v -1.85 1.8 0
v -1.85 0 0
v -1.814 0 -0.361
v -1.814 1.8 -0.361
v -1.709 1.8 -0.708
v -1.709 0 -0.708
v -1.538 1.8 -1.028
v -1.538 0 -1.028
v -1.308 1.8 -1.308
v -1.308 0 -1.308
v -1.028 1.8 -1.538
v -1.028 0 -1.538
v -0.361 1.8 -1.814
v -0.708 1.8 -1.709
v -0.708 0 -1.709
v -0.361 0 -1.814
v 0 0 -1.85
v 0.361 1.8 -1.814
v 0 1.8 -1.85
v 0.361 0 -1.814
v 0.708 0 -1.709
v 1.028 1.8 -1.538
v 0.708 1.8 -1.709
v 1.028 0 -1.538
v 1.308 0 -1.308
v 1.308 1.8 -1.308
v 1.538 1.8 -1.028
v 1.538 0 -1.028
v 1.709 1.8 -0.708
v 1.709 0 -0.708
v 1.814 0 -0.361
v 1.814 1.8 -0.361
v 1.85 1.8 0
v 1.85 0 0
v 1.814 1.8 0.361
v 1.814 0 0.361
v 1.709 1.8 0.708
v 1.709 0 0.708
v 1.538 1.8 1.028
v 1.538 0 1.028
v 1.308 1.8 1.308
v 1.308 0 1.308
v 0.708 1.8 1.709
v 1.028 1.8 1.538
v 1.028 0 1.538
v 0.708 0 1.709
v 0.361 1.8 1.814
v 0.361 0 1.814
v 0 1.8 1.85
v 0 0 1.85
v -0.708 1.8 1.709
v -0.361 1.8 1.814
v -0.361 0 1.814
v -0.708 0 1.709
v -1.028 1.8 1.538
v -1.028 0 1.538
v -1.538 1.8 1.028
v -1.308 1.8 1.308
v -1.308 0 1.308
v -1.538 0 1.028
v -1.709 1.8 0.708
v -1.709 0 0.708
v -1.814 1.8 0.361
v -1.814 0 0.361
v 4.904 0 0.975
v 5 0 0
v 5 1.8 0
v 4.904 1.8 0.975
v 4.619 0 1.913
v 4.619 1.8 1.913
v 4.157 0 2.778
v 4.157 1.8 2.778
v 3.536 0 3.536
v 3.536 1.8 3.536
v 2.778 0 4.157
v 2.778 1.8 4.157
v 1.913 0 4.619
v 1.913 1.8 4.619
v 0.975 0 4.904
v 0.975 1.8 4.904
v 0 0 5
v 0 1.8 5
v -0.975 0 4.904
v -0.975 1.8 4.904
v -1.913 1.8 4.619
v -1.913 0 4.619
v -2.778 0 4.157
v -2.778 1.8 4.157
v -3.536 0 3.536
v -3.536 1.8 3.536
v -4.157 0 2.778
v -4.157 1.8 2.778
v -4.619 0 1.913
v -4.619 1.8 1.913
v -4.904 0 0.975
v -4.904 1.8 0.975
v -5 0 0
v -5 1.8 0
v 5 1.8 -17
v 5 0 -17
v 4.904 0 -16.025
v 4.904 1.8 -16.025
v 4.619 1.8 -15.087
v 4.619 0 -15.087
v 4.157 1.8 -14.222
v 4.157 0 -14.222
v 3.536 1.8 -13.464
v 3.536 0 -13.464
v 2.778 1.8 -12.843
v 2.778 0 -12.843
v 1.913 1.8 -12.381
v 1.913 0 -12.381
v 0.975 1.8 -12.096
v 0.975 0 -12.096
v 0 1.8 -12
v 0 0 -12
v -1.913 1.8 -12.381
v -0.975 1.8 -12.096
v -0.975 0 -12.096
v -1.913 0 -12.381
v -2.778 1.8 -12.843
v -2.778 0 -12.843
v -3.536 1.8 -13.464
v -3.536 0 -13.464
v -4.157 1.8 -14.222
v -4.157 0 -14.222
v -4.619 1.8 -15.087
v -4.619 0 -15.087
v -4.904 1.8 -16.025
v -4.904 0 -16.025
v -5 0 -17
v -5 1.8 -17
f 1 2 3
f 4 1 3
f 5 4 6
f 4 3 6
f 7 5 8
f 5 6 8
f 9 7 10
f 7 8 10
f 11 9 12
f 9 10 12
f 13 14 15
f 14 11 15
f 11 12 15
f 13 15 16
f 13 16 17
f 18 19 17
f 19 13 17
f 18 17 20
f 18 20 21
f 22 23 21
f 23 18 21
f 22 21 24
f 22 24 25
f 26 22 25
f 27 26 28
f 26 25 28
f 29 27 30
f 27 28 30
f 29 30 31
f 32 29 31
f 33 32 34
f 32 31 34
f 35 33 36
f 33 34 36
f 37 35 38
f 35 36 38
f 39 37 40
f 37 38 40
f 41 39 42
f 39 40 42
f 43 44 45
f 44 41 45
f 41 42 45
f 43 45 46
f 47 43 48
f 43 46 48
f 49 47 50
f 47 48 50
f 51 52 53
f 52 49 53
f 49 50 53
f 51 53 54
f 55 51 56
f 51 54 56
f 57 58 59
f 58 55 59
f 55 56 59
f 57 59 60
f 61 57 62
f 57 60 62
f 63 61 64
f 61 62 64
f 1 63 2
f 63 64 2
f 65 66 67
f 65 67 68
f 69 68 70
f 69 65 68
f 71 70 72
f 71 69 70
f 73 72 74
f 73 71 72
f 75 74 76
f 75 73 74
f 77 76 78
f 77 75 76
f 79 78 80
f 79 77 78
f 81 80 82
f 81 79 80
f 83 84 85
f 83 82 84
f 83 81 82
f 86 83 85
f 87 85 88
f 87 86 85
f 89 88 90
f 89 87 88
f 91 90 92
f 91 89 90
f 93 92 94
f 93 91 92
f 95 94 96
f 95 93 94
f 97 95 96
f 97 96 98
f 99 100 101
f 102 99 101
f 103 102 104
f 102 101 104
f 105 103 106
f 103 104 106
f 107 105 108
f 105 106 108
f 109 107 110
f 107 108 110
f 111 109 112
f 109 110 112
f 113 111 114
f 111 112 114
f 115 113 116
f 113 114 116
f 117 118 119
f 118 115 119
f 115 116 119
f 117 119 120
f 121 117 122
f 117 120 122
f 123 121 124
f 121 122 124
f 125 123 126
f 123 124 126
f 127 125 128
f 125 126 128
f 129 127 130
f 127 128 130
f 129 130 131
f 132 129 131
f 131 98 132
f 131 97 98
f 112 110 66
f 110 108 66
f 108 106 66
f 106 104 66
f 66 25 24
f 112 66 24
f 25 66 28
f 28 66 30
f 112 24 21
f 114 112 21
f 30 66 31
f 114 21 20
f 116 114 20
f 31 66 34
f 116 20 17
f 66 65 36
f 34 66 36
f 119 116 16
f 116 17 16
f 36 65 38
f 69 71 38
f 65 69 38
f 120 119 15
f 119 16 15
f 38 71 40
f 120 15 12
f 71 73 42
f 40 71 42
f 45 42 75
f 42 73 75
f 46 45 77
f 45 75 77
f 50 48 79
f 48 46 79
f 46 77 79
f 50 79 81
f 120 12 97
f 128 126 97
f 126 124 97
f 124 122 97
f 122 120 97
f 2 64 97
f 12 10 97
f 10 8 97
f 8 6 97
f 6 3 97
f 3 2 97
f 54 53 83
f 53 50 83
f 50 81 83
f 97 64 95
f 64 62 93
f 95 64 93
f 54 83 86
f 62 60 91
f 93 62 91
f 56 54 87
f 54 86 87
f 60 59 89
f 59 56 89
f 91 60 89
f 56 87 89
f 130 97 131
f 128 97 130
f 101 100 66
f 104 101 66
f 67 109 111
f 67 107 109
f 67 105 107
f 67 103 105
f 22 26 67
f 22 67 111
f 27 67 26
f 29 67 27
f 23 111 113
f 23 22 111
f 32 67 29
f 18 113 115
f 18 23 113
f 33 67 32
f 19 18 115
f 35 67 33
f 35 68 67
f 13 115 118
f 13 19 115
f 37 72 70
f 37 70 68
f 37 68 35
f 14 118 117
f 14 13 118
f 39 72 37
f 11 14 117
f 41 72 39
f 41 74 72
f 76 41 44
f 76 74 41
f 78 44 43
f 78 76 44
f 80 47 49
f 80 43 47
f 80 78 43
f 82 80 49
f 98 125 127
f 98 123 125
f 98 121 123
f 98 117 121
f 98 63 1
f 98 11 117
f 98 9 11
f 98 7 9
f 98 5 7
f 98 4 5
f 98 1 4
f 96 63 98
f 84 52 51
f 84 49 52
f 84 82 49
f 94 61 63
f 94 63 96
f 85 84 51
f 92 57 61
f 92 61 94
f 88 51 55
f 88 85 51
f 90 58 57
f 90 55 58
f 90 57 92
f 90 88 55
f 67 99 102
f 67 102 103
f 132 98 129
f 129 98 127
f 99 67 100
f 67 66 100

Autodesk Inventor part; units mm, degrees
ref_plane "YZ Plane" through (0, 0, 0) normal (1, 0, 0) x (0, 1, 0)
ref_plane "XZ Plane" through (0, 0, 0) normal (0, 1, 0) x (-1, 0, 0)
ref_plane "XY Plane" through (0, 0, 0) normal (0, 0, 1) x (1, 0, 0)
sketch "Skizze1" plane through (0, 0, 0) normal (0, 1, 0) x (-1, 0, 0)
  circle A0 centre (0, 0) radius 1.85
  circle A1 centre (0, 0) radius 5
  line L0 (0, 0) -> (0, -12) construction
  arc A2 (5, -17) -> (-5, -17) centre (0, -17) ccw
  line L1 (5, 0) -> (5, -17)
  line L2 (-5, 0) -> (-5, -17)
  dimension "d0" = 3.7
  dimension "d1" = 10
extrude "Extrusion1" add sketch "Skizze1" along normal blind 1.8
properties part number "chain_elmt_1"
